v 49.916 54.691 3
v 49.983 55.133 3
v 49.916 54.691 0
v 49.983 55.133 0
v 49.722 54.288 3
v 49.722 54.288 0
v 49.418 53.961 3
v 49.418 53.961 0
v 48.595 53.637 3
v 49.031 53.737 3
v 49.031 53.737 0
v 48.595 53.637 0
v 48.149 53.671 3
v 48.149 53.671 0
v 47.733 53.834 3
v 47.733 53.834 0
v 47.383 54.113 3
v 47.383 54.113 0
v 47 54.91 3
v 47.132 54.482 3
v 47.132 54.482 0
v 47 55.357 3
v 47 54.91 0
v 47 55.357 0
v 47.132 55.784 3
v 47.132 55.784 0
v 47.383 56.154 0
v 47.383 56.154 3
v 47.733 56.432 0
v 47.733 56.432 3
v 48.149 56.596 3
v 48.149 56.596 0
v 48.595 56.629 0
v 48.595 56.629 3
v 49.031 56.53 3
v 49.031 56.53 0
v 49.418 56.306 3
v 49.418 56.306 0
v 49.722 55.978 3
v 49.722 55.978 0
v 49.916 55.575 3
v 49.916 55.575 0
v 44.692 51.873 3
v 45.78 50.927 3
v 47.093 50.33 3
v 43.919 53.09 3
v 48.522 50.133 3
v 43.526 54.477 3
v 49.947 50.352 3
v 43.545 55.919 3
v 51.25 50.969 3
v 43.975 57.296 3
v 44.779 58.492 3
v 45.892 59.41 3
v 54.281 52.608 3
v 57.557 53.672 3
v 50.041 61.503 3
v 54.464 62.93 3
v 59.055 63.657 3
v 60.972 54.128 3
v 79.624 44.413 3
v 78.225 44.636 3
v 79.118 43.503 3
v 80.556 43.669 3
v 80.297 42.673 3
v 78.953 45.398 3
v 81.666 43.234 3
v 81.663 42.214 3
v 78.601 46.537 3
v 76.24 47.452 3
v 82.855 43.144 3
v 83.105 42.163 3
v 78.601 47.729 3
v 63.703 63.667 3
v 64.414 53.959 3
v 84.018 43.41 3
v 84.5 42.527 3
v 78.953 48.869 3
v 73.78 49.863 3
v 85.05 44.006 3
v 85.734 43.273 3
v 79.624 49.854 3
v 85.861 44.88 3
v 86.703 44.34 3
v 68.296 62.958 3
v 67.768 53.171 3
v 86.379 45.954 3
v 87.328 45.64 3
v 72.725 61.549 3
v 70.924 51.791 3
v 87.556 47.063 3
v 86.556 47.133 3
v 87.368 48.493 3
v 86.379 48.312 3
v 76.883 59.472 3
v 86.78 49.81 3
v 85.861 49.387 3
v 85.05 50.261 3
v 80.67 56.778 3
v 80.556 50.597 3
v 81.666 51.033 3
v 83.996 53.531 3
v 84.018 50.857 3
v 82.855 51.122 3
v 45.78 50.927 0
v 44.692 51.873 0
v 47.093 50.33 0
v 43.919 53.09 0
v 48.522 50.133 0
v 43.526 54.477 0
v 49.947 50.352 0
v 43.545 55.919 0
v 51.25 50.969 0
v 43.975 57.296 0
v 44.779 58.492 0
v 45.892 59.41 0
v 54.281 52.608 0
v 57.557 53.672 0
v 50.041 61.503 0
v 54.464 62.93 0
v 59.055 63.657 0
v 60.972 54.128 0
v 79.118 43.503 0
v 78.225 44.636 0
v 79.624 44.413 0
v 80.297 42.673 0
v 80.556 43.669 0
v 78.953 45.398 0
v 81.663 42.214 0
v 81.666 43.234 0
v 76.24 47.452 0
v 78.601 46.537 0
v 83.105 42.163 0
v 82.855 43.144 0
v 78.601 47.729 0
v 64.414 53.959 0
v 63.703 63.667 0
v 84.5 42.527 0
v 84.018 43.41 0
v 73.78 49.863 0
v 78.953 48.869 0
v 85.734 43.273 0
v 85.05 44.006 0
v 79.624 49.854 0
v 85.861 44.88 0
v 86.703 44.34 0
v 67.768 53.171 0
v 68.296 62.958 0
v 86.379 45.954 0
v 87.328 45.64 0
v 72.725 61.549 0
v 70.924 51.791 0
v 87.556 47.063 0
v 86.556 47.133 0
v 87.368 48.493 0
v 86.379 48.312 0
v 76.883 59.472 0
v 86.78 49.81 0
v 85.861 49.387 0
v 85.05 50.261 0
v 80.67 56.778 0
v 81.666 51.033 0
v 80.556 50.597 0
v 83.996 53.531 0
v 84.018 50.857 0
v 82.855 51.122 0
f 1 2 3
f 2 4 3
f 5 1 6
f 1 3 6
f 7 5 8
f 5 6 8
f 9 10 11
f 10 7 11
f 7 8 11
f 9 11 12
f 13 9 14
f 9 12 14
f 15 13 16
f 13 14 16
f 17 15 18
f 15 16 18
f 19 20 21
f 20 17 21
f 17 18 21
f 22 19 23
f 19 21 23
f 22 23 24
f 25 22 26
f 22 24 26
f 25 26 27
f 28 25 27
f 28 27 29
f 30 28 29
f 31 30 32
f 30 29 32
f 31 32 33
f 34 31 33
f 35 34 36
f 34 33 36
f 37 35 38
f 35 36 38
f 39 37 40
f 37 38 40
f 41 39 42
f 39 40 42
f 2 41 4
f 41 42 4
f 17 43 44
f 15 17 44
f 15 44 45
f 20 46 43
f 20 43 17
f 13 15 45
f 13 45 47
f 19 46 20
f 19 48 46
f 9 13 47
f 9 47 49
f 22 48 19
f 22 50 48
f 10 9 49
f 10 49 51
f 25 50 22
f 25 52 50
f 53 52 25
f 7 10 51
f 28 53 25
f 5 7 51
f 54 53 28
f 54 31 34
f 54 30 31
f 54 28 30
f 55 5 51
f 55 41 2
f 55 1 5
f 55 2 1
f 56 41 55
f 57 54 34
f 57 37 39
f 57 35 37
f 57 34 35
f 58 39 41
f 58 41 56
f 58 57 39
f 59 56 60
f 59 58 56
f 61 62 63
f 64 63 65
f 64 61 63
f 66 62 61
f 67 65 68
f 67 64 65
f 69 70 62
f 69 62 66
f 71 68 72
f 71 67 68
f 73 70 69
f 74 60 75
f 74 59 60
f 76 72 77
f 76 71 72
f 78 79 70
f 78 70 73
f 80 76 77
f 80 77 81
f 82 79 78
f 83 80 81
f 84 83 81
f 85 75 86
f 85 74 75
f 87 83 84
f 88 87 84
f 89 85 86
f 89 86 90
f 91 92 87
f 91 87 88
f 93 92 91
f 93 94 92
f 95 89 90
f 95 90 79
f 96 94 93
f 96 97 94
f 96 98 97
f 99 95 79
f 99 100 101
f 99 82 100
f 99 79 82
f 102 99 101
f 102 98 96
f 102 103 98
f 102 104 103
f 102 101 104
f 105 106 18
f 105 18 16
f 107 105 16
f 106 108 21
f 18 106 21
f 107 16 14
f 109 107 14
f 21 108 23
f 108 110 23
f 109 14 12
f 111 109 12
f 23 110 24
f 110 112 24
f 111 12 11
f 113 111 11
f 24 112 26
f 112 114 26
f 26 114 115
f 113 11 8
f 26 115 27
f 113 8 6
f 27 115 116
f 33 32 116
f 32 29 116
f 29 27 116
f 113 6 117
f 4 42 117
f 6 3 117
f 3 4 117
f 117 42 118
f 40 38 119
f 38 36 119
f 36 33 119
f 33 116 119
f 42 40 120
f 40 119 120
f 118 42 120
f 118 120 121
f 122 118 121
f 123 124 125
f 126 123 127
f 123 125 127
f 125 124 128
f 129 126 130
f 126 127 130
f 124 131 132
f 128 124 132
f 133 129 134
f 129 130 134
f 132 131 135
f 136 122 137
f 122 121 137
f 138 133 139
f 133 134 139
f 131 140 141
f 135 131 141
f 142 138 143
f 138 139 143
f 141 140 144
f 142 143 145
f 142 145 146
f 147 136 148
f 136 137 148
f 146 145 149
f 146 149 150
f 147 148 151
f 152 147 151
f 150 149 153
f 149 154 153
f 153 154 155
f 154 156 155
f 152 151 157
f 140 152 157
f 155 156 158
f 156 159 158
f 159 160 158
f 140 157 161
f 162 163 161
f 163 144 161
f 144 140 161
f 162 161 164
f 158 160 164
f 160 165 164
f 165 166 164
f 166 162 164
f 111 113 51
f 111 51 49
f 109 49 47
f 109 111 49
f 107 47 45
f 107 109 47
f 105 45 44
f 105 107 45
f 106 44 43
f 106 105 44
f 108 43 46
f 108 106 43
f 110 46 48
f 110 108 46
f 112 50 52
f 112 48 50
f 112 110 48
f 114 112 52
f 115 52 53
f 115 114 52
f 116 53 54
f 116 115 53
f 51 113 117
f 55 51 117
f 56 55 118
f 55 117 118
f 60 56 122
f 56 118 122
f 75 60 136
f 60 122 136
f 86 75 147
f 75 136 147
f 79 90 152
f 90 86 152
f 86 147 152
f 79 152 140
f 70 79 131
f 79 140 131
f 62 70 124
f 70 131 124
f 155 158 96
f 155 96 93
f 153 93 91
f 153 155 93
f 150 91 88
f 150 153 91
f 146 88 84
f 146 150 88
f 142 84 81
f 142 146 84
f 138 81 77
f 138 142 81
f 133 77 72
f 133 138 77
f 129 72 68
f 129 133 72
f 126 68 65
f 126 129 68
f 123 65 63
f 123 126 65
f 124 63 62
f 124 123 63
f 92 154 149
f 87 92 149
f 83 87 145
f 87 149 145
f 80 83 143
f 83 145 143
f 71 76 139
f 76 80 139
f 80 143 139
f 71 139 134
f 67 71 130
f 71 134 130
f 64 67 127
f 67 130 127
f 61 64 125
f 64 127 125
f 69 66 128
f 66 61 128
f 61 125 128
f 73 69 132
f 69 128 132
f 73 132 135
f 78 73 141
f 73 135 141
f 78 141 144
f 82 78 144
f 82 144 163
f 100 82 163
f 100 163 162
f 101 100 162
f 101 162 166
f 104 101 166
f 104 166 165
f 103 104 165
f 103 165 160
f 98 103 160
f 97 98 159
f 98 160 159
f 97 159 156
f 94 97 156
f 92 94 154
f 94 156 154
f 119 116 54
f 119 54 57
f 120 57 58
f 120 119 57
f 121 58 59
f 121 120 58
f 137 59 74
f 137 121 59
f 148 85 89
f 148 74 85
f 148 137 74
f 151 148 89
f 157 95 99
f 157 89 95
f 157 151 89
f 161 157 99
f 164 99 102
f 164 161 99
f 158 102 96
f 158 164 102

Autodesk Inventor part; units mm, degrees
ref_plane "YZ Plane" through (0, 0, 0) normal (1, 0, 0) x (0, 1, 0)
ref_plane "XZ Plane" through (0, 0, 0) normal (0, 1, 0) x (-1, 0, 0)
ref_plane "XY Plane" through (0, 0, 0) normal (0, 0, 1) x (1, 0, 0)
sketch "スケッチ1" plane through (0, 0, 0) normal (0, 0, 1) x (1, 0, 0)
  circle A0 centre (104.0735, 2) radius 6.025
  arc A1 (100.4168, -2.7885) -> (70.6822, 5.0468) centre (76.1402, -34.5791) ccw
  line L0 (69.7806, -5) -> (104.0735, 2) construction
  circle A2 centre (69.7806, -5) radius 5 construction
  arc A3 (102.7574, -3.8795) -> (72.4739, -9.2126) centre (94.0202, -42.9136) ccw construction
  circle A4 centre (75.3506, 22) radius 5 construction
  circle A5 centre (70, 10) radius 1.5
  circle A6 centre (70, 10) radius 5
  arc A7 (109.4834, 4.652) -> (75.6055, 26.9935) centre (73.5667, -12.9545) ccw construction
  arc A8 (108.1244, 6.4599) -> (68.3957, 14.7356) centre (81.2303, -23.1494) ccw
  arc A9 (105.8851, 7.7462) -> (66.341, -1.371) centre (93.8576, -30.4027) ccw construction
  line L1 (70, 10) -> (104.0735, 2) construction
  circle A10 centre (82.0403, 11.2819) radius 1.5
  line L2 (48.483, 55.1333) -> (82.5564, 47.1333) construction
  line L3 (82.5564, 47.1333) -> (53.8336, 67.1333) construction
  line L4 (82.5564, 47.1333) -> (48.2636, 40.1333) construction
  circle A11 centre (53.8336, 67.1333) radius 5 construction
  circle A12 centre (48.2636, 40.1333) radius 5 construction
  circle A13 centre (48.483, 55.1333) radius 5
  circle A14 centre (82.5564, 47.1333) radius 1.5
  circle A15 centre (82.5564, 47.1333) radius 5
  circle A16 centre (48.483, 55.1333) radius 1.5
  arc A17 (77.6092, 46.4087) -> (54.8703, 62.242) centre (58.8098, 43.6549) ccw construction
  arc A18 (78.225, 44.6356) -> (51.2502, 50.9689) centre (61.7656, 35.1441) ccw
  arc A19 (79.6686, 43.0516) -> (52.5201, 37.51) centre (68.6948, 27.5411) ccw construction
  arc A20 (85.2716, 51.3319) -> (44.1201, 42.9319) centre (68.9807, 26.1405) ccw construction
  arc A21 (86.7799, 49.8095) -> (45.8918, 59.4095) centre (61.4389, 33.7524) ccw
  arc A22 (87.4691, 48.0636) -> (53.0017, 72.0636) centre (57.993, 42.4818) ccw construction
  circle A23 centre (82.5564, 47.1333) radius 4
  point P0 (0, 0)
  point P1 (0, 0)
  dimension "d0" = 40
  dimension "d1" = 10
  dimension "d2" = 40
  dimension "d3" = 10
  dimension "d4" = 10
  dimension "d5" = 3
  dimension "d6" = 19
  dimension "d7" = 30
  dimension "d8" = 3
  dimension "d9" = 8
extrude "押し出し1" add sketch "スケッチ1" along normal blind 3 contours A13 | A13 A21 A15 A18 | A15
properties part number "heikou平行" material "アルミニウム 2014-T4"
